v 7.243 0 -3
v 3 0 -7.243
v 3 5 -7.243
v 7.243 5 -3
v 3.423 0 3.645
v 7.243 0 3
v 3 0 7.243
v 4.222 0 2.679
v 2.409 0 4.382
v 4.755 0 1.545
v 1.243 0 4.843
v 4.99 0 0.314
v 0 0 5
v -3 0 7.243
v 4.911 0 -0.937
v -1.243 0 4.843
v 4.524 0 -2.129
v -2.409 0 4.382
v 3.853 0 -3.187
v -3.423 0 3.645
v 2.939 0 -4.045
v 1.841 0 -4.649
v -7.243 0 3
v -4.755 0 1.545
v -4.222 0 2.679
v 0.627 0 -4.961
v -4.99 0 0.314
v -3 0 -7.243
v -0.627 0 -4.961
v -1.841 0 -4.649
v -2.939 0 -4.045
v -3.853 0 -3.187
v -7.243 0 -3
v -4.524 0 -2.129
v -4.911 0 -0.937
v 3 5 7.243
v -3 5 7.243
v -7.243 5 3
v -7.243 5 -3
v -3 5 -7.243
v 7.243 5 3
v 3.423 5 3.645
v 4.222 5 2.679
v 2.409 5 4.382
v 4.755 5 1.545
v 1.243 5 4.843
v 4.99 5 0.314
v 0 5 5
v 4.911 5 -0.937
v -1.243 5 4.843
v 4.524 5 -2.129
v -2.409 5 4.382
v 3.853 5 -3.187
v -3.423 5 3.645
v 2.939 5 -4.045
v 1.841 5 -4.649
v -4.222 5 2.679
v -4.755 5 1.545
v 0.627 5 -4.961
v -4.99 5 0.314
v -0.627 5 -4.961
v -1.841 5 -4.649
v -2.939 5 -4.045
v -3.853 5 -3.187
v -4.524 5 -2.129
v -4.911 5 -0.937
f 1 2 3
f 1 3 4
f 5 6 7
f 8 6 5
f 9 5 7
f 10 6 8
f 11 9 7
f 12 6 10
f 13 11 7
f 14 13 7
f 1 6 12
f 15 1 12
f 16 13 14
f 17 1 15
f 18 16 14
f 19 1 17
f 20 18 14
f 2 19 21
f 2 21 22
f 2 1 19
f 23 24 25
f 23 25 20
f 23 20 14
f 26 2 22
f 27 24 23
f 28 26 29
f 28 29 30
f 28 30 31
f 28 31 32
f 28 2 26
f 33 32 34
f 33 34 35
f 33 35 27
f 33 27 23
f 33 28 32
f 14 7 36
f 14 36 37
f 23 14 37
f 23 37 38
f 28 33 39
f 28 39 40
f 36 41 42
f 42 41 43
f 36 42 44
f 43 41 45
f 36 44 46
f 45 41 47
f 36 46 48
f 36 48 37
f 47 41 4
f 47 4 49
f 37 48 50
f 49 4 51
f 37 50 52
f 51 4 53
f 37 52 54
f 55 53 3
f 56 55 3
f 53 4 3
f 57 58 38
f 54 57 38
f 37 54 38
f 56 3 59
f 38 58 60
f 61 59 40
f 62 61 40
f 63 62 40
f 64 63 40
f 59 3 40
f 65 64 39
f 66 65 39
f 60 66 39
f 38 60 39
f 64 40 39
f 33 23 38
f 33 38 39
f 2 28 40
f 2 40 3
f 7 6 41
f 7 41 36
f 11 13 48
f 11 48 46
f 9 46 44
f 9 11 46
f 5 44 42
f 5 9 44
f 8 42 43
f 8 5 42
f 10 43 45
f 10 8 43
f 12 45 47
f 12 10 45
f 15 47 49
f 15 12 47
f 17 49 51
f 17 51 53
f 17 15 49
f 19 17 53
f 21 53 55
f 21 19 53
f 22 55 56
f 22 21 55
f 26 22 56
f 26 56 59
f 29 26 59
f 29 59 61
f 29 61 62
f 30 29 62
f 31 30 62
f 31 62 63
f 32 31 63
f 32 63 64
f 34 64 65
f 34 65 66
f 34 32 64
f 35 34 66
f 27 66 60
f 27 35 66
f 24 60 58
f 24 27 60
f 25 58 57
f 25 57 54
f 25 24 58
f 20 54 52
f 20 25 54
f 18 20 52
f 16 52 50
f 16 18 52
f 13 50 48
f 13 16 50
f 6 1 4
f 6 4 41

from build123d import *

# Parameters (mm, degrees)
ESBO_O1_R                = 5
RESSALTO_EXTRUS_O1_DEPTH = 5


with BuildPart() as part:
    # Esboço1 → Ressalto-extrusão1 (new body)
    with BuildSketch(Plane(origin=(0, 0, 0), x_dir=(1, 0, 0), z_dir=(0, 1, 0))):
        Polygon((-3, 7.242640687), (3, 7.242640687), (7.242640687, 3), (7.242640687, -3), (3, -7.242640687), (-3, -7.242640687), (-7.242640687, -3), (-7.242640687, 3), align=None)
        with Locations(Location((0, 0, 0), (0, 0, 270))):
            Circle(ESBO_O1_R, mode=Mode.SUBTRACT)
    extrude(amount=RESSALTO_EXTRUS_O1_DEPTH)


solid = part.part
